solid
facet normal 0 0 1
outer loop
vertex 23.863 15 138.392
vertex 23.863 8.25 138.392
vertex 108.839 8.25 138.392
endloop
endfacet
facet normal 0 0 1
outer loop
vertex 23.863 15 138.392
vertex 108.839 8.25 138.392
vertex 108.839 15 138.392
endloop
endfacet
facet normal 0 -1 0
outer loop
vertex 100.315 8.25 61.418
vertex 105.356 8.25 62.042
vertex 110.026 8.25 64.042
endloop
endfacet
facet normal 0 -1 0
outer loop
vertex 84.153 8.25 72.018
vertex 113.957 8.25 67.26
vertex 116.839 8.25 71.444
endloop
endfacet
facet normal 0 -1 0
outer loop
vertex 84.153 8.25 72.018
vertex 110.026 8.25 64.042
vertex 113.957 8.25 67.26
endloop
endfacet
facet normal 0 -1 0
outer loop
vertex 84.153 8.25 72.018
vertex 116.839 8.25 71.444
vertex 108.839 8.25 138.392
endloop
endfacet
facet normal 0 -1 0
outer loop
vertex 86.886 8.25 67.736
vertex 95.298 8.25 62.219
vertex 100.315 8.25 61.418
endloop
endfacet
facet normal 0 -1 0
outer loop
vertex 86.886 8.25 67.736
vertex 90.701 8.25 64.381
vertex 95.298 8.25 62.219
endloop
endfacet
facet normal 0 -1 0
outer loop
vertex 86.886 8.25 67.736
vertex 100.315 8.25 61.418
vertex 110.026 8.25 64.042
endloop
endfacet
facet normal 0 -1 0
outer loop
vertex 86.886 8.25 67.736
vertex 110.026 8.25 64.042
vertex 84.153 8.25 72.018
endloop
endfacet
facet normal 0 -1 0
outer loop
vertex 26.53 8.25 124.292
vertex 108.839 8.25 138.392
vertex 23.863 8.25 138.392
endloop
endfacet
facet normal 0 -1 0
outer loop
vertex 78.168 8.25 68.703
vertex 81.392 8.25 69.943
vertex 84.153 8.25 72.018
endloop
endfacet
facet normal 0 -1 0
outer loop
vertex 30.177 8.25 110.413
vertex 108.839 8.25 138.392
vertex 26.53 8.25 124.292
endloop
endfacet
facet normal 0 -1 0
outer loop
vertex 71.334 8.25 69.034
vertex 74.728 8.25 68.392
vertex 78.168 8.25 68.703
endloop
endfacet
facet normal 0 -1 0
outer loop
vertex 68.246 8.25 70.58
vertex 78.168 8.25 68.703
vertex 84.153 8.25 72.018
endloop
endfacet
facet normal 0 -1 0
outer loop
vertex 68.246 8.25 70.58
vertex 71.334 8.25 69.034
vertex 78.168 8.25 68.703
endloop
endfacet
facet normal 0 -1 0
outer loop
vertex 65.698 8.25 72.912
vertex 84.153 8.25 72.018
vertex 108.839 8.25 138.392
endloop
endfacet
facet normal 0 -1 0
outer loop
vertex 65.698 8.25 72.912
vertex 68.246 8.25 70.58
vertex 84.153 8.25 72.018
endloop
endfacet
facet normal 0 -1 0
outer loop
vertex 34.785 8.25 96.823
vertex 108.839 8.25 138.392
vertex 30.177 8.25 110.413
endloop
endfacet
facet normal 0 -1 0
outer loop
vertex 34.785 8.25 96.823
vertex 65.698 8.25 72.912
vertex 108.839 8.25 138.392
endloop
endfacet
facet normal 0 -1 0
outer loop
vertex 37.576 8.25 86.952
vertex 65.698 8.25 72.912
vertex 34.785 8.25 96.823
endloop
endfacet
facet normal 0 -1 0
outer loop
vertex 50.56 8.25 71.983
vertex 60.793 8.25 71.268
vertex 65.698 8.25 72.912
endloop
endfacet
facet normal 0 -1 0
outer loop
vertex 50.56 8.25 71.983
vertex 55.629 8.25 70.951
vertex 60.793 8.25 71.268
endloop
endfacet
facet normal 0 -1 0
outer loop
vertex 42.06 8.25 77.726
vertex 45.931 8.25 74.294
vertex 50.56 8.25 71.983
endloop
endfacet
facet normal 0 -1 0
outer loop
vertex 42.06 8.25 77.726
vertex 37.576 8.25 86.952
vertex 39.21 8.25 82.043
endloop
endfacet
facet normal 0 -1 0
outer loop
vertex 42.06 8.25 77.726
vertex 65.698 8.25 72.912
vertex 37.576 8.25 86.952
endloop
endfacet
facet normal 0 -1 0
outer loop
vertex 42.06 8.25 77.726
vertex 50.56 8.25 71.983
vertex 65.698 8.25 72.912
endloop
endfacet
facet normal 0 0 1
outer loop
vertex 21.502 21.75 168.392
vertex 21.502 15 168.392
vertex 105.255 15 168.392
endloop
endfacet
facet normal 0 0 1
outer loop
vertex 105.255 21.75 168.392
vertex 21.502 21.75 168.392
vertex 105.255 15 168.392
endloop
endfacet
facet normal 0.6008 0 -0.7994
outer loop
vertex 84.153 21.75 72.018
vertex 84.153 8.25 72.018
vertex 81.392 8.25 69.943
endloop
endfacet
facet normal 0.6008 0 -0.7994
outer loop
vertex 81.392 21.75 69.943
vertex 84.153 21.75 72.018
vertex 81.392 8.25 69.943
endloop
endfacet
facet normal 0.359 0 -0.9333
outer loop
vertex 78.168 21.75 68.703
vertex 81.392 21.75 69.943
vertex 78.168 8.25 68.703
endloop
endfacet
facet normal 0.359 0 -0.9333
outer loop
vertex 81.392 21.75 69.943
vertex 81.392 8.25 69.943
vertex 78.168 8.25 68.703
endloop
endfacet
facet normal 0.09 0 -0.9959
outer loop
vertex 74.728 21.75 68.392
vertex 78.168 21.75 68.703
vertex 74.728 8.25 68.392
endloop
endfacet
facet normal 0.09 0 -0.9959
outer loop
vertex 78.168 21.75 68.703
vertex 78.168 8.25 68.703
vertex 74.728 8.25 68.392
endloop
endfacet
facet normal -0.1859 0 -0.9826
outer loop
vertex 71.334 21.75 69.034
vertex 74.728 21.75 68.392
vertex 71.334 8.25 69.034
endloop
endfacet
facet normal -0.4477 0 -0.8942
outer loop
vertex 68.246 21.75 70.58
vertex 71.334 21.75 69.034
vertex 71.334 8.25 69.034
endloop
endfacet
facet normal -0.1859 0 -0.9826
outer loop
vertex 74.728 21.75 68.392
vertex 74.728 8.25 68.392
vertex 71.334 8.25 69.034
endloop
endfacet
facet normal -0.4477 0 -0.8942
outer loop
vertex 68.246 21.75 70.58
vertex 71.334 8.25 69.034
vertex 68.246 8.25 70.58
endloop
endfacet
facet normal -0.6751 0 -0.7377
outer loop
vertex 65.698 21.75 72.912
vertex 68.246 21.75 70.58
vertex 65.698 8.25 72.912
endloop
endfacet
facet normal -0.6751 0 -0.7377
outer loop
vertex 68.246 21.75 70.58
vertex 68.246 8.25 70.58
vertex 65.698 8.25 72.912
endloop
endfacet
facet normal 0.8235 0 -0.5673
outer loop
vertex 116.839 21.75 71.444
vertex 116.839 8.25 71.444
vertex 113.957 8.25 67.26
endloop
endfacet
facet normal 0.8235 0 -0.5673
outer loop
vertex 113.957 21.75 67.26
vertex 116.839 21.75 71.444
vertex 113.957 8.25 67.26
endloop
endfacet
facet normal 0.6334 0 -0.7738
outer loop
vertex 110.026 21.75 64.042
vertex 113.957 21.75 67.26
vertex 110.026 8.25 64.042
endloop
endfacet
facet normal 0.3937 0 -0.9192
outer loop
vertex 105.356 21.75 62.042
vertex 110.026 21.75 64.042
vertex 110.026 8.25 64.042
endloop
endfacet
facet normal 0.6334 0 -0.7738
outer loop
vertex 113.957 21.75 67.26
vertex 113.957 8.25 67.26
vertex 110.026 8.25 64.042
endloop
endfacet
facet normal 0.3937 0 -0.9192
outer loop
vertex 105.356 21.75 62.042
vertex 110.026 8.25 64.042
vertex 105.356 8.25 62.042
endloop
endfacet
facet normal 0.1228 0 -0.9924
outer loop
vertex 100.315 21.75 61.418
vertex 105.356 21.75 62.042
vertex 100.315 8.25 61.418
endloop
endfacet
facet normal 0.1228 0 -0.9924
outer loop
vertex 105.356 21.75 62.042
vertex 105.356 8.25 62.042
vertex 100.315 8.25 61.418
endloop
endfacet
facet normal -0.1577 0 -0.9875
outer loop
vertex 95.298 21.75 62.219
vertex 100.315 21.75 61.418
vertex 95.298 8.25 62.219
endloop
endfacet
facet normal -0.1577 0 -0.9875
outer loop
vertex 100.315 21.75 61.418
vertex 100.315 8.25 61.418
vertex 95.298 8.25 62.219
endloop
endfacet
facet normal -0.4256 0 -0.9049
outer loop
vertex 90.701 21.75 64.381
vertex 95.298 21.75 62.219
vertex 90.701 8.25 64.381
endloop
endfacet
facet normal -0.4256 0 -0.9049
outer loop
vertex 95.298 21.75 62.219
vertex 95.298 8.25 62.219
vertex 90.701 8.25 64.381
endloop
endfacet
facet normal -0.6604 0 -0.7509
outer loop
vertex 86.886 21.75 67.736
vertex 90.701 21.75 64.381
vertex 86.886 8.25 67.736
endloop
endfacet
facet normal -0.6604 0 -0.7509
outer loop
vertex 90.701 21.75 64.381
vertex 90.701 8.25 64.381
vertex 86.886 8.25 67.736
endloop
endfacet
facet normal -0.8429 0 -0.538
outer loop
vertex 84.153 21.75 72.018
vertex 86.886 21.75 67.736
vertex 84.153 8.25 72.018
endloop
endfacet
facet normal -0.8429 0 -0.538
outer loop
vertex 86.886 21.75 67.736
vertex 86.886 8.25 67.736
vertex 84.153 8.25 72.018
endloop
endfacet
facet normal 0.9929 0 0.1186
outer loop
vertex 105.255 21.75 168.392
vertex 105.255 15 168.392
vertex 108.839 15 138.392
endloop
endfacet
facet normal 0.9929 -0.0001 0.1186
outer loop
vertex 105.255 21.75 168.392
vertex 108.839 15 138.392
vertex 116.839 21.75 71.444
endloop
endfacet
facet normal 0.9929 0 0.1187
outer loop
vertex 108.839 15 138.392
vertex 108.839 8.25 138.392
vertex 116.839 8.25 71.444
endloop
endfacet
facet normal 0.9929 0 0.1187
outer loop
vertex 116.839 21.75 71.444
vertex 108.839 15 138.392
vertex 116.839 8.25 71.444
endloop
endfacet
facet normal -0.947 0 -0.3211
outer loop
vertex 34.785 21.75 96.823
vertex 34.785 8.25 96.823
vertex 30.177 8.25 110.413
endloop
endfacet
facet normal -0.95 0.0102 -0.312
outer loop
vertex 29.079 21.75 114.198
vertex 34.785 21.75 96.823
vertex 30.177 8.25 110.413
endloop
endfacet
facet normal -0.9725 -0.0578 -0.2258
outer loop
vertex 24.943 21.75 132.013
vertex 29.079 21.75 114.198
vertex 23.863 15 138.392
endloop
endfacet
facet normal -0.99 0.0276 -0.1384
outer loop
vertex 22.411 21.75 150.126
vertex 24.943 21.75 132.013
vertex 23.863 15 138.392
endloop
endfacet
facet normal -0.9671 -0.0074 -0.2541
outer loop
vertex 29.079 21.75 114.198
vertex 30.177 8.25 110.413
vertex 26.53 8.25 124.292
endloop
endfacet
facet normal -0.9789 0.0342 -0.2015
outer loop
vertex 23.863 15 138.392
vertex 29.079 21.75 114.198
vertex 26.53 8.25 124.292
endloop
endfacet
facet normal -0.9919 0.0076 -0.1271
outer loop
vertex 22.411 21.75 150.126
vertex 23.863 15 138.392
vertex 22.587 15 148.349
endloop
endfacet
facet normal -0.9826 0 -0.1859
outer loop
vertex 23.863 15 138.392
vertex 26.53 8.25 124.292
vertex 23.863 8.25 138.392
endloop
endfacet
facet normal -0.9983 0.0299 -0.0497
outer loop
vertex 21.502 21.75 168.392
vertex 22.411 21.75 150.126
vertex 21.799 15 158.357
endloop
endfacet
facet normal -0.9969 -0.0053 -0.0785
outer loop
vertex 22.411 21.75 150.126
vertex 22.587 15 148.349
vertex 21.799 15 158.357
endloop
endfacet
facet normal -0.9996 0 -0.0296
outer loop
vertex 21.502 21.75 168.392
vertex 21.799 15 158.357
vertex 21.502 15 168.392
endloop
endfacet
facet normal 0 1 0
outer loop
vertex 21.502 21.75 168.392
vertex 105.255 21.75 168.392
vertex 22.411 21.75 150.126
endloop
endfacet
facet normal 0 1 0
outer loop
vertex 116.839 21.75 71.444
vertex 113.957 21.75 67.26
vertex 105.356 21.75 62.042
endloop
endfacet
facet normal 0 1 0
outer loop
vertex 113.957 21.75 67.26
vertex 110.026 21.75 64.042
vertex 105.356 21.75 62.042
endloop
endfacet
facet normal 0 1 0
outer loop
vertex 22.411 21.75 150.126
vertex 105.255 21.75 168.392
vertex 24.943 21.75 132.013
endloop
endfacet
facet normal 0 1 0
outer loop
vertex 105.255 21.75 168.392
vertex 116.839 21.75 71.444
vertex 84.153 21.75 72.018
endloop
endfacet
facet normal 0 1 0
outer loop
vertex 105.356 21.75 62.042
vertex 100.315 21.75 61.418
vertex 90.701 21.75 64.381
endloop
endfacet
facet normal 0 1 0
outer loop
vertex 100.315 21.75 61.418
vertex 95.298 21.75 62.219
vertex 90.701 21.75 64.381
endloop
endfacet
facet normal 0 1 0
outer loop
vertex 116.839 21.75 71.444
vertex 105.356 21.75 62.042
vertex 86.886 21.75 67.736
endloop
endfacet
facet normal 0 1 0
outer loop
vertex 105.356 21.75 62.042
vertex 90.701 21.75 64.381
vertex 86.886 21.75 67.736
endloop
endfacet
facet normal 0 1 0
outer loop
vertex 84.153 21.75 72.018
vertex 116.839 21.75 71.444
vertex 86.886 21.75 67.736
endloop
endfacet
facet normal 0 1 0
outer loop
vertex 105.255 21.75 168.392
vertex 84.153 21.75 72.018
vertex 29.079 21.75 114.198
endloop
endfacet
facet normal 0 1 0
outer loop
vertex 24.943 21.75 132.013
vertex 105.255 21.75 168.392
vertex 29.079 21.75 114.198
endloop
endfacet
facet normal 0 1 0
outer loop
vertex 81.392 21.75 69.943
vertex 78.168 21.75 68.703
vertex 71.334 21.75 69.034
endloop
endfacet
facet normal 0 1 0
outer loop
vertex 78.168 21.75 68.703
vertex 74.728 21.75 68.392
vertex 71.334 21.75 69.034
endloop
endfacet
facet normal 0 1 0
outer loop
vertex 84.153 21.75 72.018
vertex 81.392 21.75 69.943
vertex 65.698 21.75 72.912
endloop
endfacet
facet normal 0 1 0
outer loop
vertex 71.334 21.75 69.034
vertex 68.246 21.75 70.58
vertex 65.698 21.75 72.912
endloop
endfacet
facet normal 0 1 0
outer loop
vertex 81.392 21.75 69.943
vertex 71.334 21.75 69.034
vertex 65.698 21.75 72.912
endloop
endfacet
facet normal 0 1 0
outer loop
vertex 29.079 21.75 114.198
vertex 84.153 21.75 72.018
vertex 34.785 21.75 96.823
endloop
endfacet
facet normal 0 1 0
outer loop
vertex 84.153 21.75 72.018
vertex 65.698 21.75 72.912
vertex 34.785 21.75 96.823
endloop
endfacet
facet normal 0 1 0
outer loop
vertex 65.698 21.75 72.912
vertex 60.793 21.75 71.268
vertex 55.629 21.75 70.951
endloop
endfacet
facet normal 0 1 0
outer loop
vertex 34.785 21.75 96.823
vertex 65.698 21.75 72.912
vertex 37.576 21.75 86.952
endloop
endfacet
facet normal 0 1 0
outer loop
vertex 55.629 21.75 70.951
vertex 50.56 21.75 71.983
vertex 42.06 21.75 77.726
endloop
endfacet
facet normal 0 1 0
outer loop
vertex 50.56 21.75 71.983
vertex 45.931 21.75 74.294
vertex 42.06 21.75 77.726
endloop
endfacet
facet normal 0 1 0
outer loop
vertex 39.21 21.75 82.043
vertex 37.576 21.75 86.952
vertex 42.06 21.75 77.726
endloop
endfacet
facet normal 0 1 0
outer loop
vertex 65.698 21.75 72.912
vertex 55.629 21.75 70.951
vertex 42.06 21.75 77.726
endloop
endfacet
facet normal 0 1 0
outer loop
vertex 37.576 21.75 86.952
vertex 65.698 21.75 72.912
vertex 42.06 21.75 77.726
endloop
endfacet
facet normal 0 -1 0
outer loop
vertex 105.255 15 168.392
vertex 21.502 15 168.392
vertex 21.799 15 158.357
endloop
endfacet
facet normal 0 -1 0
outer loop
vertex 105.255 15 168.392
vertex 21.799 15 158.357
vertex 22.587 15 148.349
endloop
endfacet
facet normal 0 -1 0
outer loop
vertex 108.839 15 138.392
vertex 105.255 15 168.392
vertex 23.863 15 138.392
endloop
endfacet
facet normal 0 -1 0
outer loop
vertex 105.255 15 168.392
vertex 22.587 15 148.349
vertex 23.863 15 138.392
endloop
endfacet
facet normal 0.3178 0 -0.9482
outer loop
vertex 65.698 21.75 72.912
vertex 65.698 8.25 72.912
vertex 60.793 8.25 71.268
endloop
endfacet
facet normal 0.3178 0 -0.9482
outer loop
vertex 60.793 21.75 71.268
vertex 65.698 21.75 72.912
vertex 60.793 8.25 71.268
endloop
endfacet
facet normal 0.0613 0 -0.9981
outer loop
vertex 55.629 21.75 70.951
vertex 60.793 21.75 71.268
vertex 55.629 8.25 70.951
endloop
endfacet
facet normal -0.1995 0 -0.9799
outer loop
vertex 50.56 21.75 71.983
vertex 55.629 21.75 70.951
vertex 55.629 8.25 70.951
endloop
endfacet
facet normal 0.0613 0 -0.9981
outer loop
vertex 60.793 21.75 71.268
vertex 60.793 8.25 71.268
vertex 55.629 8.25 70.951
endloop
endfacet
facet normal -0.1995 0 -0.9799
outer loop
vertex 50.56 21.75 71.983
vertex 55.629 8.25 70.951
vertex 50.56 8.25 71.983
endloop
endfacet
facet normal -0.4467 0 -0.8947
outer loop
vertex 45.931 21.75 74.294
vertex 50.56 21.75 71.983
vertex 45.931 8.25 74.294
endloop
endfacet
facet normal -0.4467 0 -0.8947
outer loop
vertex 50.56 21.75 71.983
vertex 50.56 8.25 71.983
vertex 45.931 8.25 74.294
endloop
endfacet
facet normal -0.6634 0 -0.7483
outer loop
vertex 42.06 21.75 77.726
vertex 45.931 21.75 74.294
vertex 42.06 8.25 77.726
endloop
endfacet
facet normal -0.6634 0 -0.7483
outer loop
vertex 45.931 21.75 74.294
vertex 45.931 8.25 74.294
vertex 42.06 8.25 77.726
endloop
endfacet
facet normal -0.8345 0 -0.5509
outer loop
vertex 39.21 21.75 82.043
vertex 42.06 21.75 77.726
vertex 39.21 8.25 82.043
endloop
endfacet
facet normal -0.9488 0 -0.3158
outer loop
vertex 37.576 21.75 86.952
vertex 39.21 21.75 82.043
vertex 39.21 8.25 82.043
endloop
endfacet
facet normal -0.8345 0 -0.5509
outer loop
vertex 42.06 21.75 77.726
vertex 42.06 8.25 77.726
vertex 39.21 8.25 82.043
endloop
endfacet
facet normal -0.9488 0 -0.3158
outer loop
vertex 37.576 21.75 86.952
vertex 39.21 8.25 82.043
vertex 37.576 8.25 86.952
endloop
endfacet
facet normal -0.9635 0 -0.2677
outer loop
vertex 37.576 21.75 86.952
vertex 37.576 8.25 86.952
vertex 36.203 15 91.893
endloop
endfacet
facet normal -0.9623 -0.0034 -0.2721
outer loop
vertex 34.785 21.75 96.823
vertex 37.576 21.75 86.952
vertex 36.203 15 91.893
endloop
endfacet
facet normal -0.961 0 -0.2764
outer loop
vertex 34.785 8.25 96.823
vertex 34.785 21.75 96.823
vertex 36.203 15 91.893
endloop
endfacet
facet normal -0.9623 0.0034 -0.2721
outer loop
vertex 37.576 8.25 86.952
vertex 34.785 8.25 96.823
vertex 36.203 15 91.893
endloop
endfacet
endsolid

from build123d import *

# Parameters (mm, degrees)
PIED_GAUCHE_SYM_TRIQUE_START = 8.25
PIED_GAUCHE_SYM_TRIQUE_DEPTH = 13.5
ESQUISSE2_W                  = 127.532024566
ESQUISSE2_H                  = 119.503632389
ENL_V_MAT_EXTRU_3_DEPTH      = 302.826111243
ESQUISSE3_W                  = 31.738465923
ESQUISSE3_H                  = 10.347254195
ENL_V_MAT_EXTRU_5_DEPTH      = 207.107541608


# Read off the part's stored shape, not the designer's step: pied_gauche_Symétrique
with BuildPart() as part:
    # pied_gauche_Symétrique outline → pied_gauche_Symétrique (new body)
    with BuildSketch(Plane(origin=(0, 0, 0), x_dir=(1, 0, 0), z_dir=(0, 1, 0)).offset(PIED_GAUCHE_SYM_TRIQUE_START)):
        with BuildLine():
            add(Edge.make_bspline(
                [(37.478644966, -252.078923217), (36.315942048, -246.147042601), (34.178554605, -240.439587675)],
                knots=[0.172395677, 0.172395677, 0.172395677, 1, 1, 1], degree=2))
            ThreePointArc((37.478644966, -252.078923217), (68.296716845, -277.385748803), (95.718365725, -248.433337016))
            ThreePointArc((95.718365725, -248.433337016), (95.727304168, -248.184441724), (95.749998935, -247.936422149))
            Line((95.749998935, -247.936422149), (116.839136919, -71.443633134))
            ThreePointArc((116.839136919, -71.443633134), (100.314842401, -61.417925092), (84.153017918, -72.018045866))
            ThreePointArc((84.153017918, -72.018045866), (74.728050938, -68.392019497), (65.697628344, -72.911924095))
            ThreePointArc((65.697628344, -72.911924095), (48.169524668, -72.986859822), (37.57616681, -86.951844718))
            add(Edge.make_bspline(
                [(37.57616681, -86.951844718), (36.224938138, -91.89952807), (34.78531821, -96.822767534)],
                knots=[0.221662646, 0.221662646, 0.221662646, 1, 1, 1], degree=2))
            ThreePointArc((34.78531821, -96.822767534), (21.501008197, -168.576334761), (34.178554605, -240.439587675))
        make_face()
    extrude(amount=PIED_GAUCHE_SYM_TRIQUE_DEPTH)

    # Esquisse2 → Enlèv. mat.-Extru.3 (cut, through all)
    with BuildSketch(Plane(origin=(0, 0, 0), x_dir=(1, 0, 0), z_dir=(0, 1, 0))):
        with Locations((63.766012283, -228.143835691)):
            Rectangle(ESQUISSE2_W, ESQUISSE2_H)
    extrude(amount=ENL_V_MAT_EXTRU_3_DEPTH, mode=Mode.SUBTRACT)

    # Esquisse3 → Enlèv. mat.-Extru.5 (cut, through all)
    with BuildSketch(Plane(origin=(0, 0, 0), x_dir=(0, 0, -1), z_dir=(1, 0, 0))):
        with Locations((-154.261252458, 9.826372903)):
            Rectangle(ESQUISSE3_W, ESQUISSE3_H)
    extrude(amount=ENL_V_MAT_EXTRU_5_DEPTH, mode=Mode.SUBTRACT)


solid = part.part
